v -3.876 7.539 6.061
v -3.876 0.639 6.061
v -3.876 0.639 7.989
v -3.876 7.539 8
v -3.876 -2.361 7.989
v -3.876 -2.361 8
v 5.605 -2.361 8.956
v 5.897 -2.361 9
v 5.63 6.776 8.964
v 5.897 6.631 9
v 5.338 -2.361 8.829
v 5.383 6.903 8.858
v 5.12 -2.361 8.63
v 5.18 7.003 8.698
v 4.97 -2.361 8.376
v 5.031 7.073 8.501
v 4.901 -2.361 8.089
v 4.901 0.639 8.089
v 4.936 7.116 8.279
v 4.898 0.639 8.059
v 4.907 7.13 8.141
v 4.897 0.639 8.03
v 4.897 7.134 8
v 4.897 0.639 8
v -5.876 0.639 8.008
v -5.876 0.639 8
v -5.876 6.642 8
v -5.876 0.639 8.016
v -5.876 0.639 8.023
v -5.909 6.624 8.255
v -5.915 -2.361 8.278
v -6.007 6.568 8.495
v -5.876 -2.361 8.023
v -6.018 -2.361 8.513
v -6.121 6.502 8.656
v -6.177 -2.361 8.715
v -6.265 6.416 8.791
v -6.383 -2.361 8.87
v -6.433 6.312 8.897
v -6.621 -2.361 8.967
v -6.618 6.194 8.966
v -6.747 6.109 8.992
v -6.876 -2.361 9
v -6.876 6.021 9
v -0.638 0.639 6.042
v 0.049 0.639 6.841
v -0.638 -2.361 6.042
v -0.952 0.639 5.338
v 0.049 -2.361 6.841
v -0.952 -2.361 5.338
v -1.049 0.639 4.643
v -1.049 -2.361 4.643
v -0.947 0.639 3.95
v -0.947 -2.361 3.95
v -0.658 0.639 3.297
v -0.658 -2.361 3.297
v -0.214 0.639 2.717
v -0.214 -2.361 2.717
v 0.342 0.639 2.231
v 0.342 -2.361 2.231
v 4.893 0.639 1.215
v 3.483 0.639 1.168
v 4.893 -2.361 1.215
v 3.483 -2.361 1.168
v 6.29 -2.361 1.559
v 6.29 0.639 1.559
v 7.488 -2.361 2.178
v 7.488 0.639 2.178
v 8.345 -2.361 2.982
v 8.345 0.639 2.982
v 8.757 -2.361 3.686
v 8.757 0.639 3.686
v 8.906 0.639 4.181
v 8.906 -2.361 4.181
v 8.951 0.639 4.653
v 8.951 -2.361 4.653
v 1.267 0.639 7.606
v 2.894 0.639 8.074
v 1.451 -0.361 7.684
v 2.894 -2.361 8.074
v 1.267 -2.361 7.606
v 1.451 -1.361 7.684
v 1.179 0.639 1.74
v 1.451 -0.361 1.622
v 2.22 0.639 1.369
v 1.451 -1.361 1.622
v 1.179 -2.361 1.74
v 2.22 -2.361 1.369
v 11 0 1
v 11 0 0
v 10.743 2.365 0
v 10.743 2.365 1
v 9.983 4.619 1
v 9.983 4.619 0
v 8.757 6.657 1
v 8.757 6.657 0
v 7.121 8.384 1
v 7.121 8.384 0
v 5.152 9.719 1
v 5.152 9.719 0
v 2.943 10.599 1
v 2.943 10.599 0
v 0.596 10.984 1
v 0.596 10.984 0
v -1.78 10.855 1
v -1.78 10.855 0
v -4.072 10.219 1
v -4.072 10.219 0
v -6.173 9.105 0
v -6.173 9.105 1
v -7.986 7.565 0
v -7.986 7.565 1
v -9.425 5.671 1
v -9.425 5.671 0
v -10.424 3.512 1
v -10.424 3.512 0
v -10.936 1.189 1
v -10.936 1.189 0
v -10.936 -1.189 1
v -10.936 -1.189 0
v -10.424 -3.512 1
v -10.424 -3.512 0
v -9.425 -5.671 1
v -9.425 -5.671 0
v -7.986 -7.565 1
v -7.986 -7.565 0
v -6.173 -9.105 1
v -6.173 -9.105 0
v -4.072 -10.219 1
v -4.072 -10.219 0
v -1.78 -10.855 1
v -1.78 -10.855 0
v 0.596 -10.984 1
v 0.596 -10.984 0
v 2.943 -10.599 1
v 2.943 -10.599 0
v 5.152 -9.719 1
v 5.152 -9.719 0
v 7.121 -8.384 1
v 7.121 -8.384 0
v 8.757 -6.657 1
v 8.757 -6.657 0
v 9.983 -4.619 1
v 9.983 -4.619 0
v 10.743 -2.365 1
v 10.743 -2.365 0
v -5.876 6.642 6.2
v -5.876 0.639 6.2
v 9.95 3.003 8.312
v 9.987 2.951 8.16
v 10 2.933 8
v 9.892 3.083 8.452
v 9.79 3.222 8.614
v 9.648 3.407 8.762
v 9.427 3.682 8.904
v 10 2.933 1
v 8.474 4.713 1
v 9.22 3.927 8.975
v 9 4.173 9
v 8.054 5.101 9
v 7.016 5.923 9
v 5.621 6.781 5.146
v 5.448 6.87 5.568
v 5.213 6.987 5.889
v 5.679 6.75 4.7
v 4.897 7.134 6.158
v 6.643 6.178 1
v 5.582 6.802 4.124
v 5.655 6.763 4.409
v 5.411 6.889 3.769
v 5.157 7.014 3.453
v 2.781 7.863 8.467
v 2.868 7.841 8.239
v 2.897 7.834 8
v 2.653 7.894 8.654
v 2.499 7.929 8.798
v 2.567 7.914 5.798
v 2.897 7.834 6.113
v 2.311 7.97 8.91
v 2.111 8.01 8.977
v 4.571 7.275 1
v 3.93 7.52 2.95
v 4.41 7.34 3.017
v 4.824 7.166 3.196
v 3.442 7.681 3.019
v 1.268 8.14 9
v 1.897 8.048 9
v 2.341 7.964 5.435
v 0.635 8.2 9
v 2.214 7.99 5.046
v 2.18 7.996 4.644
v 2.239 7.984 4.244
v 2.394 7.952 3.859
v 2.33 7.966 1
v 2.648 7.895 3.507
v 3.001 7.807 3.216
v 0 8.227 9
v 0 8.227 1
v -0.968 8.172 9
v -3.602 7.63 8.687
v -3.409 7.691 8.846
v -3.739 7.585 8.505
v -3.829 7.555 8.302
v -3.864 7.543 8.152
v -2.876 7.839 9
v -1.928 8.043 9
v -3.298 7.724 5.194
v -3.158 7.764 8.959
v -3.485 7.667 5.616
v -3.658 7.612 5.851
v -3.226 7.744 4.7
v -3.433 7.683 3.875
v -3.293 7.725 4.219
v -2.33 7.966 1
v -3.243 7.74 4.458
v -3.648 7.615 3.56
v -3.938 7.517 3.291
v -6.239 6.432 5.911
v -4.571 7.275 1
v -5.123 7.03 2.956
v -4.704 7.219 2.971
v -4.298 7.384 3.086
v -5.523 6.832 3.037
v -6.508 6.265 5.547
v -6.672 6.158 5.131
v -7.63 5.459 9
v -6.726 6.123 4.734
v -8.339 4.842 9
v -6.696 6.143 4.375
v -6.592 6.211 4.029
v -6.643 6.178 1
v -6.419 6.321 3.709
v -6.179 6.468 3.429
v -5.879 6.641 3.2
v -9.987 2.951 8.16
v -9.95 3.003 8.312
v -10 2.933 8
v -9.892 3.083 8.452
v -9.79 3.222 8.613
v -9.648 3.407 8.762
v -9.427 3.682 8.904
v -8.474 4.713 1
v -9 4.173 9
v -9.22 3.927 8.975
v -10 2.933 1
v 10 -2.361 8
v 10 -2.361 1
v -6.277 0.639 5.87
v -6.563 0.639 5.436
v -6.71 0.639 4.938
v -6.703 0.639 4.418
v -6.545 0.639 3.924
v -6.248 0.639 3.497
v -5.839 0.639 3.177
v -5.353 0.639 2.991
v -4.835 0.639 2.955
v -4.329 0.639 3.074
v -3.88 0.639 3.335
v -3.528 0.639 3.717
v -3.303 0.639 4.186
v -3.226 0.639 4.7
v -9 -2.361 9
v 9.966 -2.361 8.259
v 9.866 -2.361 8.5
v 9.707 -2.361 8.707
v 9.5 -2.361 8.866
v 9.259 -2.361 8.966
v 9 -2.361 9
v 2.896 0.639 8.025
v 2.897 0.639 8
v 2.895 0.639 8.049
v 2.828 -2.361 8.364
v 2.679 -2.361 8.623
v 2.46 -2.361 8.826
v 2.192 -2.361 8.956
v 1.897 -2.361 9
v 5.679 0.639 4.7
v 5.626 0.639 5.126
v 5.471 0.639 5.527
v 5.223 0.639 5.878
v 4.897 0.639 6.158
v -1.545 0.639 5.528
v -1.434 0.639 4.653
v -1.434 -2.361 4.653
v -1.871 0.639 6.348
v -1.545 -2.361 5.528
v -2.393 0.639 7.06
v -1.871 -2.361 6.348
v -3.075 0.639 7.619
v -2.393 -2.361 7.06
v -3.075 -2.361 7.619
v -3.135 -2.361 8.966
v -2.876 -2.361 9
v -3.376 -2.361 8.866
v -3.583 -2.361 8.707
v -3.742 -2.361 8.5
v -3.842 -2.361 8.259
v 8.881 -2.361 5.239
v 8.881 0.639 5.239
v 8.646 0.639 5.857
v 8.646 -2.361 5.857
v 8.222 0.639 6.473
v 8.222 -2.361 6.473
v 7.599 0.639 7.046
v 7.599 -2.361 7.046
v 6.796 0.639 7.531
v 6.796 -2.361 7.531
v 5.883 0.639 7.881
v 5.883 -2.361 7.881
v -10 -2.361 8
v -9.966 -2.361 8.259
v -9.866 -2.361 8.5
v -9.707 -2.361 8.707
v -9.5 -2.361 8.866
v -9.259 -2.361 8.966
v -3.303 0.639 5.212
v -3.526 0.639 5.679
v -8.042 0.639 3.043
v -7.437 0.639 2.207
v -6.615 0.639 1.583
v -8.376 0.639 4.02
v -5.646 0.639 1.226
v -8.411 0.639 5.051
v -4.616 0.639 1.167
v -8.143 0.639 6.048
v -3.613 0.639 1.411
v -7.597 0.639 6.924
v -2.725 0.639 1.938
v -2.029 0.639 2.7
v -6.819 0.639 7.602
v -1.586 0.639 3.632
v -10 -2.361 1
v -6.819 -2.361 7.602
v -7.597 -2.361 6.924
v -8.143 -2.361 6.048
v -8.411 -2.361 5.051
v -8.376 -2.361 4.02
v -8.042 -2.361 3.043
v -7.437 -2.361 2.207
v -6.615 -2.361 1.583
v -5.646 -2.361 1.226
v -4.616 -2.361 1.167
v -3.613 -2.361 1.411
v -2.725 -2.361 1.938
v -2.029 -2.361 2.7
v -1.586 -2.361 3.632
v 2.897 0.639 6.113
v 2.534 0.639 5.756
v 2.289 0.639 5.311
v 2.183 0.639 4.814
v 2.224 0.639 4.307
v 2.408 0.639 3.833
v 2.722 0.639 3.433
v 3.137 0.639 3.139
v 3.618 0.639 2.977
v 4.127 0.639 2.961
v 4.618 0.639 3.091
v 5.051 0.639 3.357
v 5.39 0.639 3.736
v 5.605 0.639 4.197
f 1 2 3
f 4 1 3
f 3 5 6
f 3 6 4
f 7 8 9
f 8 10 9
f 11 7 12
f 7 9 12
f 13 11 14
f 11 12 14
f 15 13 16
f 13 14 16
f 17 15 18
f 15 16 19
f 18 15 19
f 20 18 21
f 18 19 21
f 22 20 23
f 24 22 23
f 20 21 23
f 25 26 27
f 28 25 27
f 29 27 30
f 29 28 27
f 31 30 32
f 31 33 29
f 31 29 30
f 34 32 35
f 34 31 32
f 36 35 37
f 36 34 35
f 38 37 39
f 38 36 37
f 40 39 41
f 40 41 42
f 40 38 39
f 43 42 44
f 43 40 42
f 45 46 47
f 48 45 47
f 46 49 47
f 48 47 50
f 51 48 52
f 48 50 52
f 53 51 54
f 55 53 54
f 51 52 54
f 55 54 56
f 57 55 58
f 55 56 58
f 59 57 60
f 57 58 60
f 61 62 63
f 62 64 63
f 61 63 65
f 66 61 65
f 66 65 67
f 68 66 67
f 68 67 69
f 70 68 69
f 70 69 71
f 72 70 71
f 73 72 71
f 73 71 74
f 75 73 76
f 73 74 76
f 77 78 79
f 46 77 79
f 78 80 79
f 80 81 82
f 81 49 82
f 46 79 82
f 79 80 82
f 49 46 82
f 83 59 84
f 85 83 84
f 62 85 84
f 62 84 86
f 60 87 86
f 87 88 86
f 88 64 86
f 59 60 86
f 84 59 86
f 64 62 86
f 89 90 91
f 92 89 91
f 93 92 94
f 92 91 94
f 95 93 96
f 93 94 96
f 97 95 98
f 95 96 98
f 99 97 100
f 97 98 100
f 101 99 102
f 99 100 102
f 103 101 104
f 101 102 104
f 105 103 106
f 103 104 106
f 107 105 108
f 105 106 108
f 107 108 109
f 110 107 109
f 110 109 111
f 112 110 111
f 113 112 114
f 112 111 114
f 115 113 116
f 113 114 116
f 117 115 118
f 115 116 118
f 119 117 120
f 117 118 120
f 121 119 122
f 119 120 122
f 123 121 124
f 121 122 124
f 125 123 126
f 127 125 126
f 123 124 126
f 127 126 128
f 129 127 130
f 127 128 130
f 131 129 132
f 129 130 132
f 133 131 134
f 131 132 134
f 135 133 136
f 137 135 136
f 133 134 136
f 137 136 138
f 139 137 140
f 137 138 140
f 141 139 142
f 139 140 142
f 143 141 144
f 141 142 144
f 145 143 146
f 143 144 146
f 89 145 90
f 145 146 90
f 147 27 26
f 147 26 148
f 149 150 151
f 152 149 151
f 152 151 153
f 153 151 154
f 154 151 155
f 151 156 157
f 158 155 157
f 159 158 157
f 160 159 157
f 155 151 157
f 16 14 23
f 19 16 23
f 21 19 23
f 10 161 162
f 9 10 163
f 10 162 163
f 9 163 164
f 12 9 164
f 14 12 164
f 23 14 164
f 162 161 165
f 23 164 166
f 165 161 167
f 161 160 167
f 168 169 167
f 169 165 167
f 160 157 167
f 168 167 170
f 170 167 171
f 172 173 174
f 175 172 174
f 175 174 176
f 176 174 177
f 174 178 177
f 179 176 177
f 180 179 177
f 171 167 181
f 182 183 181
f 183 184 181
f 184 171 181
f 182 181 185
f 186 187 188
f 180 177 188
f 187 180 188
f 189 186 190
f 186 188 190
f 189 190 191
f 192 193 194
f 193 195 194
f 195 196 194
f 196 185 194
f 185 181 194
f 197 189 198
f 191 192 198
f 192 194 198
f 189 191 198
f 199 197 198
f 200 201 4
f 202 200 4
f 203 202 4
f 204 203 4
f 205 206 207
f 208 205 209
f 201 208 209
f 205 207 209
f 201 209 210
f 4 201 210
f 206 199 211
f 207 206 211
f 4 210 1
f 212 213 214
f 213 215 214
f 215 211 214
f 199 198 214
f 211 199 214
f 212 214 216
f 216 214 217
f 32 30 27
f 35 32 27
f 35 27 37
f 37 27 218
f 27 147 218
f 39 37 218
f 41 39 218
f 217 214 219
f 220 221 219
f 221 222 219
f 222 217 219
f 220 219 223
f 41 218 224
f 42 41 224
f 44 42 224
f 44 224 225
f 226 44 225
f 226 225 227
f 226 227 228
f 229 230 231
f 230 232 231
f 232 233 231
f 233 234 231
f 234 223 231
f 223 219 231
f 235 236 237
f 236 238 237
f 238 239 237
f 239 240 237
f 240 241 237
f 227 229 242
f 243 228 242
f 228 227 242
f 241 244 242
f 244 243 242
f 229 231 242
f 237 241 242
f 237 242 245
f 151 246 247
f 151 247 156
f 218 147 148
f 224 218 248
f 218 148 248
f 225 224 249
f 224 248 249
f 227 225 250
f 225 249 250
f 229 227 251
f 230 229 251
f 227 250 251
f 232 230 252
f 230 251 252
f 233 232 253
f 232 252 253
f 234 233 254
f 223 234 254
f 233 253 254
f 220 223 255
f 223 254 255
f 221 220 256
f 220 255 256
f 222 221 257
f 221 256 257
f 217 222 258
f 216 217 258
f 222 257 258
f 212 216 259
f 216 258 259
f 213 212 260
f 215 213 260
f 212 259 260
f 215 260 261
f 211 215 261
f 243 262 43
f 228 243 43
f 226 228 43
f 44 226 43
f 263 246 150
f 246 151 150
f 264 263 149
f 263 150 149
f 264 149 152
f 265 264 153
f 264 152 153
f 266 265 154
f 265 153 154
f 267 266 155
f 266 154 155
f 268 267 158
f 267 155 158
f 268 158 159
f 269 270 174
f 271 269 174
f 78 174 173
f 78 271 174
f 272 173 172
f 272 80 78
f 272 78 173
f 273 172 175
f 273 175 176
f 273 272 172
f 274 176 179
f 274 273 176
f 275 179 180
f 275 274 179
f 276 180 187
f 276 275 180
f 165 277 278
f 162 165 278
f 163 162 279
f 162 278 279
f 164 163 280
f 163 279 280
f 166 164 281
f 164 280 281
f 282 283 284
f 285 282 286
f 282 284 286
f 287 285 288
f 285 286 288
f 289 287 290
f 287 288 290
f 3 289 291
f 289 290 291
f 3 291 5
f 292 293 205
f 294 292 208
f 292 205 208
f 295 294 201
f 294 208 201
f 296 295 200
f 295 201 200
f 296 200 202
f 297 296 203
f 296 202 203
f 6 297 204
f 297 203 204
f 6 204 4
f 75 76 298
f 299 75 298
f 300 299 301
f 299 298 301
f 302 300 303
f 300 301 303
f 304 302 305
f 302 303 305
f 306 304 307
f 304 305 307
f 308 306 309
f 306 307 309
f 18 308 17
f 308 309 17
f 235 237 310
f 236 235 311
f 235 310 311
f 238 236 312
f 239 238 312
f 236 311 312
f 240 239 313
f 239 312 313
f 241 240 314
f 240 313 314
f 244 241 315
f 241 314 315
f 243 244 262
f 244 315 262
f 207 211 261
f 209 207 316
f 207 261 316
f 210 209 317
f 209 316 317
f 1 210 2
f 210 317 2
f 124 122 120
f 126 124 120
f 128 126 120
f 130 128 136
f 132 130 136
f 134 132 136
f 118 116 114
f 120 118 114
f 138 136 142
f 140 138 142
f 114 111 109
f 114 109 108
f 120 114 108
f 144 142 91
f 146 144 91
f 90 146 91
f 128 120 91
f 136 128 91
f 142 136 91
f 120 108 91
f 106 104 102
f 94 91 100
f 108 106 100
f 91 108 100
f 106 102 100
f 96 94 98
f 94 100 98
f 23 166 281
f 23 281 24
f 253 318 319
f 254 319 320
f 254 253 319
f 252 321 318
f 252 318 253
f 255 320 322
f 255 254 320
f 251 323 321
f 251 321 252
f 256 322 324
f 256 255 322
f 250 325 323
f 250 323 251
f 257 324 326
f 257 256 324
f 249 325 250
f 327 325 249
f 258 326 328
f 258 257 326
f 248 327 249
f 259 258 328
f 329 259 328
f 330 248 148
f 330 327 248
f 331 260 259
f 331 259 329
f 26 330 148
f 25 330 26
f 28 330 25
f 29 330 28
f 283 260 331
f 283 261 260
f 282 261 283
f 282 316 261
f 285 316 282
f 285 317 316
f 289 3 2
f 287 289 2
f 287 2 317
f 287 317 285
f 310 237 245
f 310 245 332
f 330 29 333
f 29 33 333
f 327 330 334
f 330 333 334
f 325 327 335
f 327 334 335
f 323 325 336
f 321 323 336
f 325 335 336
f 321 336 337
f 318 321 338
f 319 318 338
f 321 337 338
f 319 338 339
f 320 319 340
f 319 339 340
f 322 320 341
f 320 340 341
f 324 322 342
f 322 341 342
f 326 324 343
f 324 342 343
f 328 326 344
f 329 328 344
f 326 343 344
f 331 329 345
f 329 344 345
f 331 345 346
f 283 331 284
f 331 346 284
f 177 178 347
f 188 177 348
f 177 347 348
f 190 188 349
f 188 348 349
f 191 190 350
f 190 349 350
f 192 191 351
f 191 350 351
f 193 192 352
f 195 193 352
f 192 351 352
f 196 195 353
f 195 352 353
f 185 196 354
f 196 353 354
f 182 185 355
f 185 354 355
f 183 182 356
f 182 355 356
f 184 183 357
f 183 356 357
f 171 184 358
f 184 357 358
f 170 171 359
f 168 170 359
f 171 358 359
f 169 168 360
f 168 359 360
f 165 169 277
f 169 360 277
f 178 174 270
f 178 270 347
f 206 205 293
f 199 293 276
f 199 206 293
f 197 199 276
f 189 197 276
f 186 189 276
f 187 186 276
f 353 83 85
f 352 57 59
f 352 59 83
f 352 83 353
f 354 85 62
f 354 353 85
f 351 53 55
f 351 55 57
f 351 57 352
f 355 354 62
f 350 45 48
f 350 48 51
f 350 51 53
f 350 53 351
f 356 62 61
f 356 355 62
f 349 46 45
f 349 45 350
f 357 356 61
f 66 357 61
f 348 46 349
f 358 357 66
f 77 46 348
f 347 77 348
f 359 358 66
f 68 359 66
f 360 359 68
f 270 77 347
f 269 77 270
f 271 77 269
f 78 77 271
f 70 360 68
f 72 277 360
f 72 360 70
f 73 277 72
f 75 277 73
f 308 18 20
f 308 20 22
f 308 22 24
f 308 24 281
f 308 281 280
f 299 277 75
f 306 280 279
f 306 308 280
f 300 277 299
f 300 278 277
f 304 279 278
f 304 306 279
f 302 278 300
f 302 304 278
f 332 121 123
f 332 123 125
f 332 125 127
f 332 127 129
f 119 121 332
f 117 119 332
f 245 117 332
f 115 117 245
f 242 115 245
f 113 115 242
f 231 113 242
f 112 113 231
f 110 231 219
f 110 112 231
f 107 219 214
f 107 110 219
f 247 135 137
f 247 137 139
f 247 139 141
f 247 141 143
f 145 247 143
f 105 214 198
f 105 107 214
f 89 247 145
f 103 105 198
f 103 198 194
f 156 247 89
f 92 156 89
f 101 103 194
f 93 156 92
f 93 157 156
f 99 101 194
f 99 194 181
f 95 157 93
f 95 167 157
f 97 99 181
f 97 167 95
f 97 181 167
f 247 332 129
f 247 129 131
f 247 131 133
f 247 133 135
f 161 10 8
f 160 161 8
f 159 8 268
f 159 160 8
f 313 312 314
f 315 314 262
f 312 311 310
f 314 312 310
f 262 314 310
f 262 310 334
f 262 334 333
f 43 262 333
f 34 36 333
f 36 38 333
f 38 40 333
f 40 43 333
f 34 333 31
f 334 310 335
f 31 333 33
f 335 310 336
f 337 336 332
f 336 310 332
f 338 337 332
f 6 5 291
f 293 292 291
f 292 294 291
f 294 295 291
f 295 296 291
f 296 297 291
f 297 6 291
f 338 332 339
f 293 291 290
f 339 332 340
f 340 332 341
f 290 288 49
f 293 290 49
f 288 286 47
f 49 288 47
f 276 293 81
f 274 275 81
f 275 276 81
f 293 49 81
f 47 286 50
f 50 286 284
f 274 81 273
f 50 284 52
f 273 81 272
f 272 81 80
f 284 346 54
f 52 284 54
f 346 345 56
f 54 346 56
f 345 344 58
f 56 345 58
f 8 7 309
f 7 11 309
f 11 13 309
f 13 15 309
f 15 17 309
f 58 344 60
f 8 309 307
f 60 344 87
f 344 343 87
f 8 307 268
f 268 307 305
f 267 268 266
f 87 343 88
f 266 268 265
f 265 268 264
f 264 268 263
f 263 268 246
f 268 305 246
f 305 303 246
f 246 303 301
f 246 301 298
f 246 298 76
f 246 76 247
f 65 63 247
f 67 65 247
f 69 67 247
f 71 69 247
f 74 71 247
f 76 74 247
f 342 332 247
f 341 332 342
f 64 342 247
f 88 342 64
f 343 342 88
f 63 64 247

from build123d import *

# Parameters (mm, degrees)
F0_R     = 11
F1_DEPTH = 1
F3_DEPTH = 8
F4_R     = 3.5
F5_DEPTH = 3
F6_R     = 1.75
F7_DEPTH = 25
F8_W     = 2
F8_H     = 1.3584850393
F8_H_2   = 0.8566204496
F9_DEPTH = 25
F10_R    = 1


with BuildPart() as f1:
    # F0 (on Top) → F1 (new body)
    with BuildSketch(Plane.XY):
        Circle(F0_R)
    extrude(amount=F1_DEPTH)

    # F2 (on face) → F3 (join)
    with BuildSketch(Plane.XY.offset(1)):
        with BuildLine():
            Line((-10, -2.3613233584), (10, -2.3613233584))
            Line((10, -2.3613233584), (10, 2.9327942886))
            ThreePointArc((10, 2.9327942886), (5.6326397358, 6.7748392798), (0, 8.2269119357))
            ThreePointArc((0, 8.2269119357), (-5.6326397358, 6.7748392798), (-10, 2.9327942886))
            Line((-10, 2.9327942886), (-10, -2.3613233584))
        make_face()
    extrude(amount=F3_DEPTH)

    # F4 (on face) → F5 (cut)
    with BuildSketch(Plane.XZ.offset(2.3613233584)):
        with BuildLine():
            add(Edge.make_bspline(
                [(8.9514442906, 4.652726464), (8.9514442906, 10.7149042905), (1.4514442906, 7.6838153772), (-6.0485557094, 4.652726464), (1.4514442906, 1.6216375507), (8.9514442906, -1.4094513625), (8.9514442906, 4.652726464)],
                knots=[0, 0, 0, 2.0943951024, 2.0943951024, 4.1887902048, 4.1887902048, 6.2831853072, 6.2831853072, 6.2831853072], degree=2, weights=[1, 0.5, 1, 0.5, 1, 0.5, 1]))
        make_face()
        with Locations((-4.9335886724, 4.652726464)):
            Circle(F4_R)
    extrude(amount=-F5_DEPTH, mode=Mode.SUBTRACT)

    # F6 (on face) → F7 (cut)
    with BuildSketch(Plane.XZ.offset(2.3613233584)):
        with Locations((-4.9761696719, 4.699612502)):
            Circle(F6_R)
        with Locations((3.9290110581, 4.699612502)):
            Circle(F6_R)
    extrude(amount=-F7_DEPTH, mode=Mode.SUBTRACT)

    # F8 (on face) → F9 (cut)
    with BuildSketch(Plane.XZ.offset(2.3613233584)):
        with Locations((-4.8761131, 9.6792425197)):
            Rectangle(F8_W, F8_H)
        with BuildLine():
            Line((-3.8761131, 9), (-5.8761131, 9))
            Line((-5.8761131, 9), (-5.8761131, 8.0234307974))
            ThreePointArc((-5.8761131, 8.0234307974), (-4.8736122222, 8.1522125442), (-3.8761131, 7.989153507))
            Line((-3.8761131, 7.989153507), (-3.8761131, 9))
        make_face()
        with BuildLine():
            ThreePointArc((-3.8761131, 7.989153507), (-4.8736122222, 8.1522125442), (-5.8761131, 8.0234307974))
            Line((-5.8761131, 8.0234307974), (-5.8761131, 5.3584850393))
            Line((-5.8761131, 5.3584850393), (-3.8761131, 5.3584850393))
            Line((-3.8761131, 5.3584850393), (-3.8761131, 7.989153507))
        make_face()
        with BuildLine():
            add(Edge.make_bspline(
                [(4.8966631293, 8.0896167823), (3.8943802836, 8.2246849702), (2.8966631293, 8.0739607418)],
                knots=[1.352399947, 1.352399947, 1.352399947, 1.7466916301, 1.7466916301, 1.7466916301], degree=2, weights=[0.7712353122, 0.7986692612, 0.8615451927]))
            Line((2.8966631293, 8.0739607418), (2.8966631293, 4.8566204496))
            Line((2.8966631293, 4.8566204496), (4.8966631293, 4.8566204496))
            Line((4.8966631293, 4.8566204496), (4.8966631293, 8.0896167823))
        make_face()
        with BuildLine():
            Line((4.8966631293, 9), (2.8966631293, 9))
            Line((2.8966631293, 9), (2.8966631293, 8.0739607418))
            add(Edge.make_bspline(
                [(4.8966631293, 8.0896167823), (3.8943802836, 8.2246849702), (2.8966631293, 8.0739607418)],
                knots=[1.352399947, 1.352399947, 1.352399947, 1.7466916301, 1.7466916301, 1.7466916301], degree=2, weights=[0.7712353122, 0.7986692612, 0.8615451927]))
            Line((4.8966631293, 8.0896167823), (4.8966631293, 9))
        make_face()
        with Locations((3.8966631293, 9.4283102248)):
            Rectangle(F8_W, F8_H_2)
    extrude(amount=-F9_DEPTH, mode=Mode.SUBTRACT)

    # F10
    f10_edges = [f1.edges().sort_by_distance(p)[0] for p in [
        (-10, 0.285735, 9),
        (-5.876113, 2.140573, 9),
        (-3.876113, 2.588768, 9),
        (2.896663, 2.736384, 9),
        (4.896663, 2.38641, 9),
        (10, 0.285735, 9),
    ]]
    fillet(f10_edges, radius=F10_R)


solid = f1.part
